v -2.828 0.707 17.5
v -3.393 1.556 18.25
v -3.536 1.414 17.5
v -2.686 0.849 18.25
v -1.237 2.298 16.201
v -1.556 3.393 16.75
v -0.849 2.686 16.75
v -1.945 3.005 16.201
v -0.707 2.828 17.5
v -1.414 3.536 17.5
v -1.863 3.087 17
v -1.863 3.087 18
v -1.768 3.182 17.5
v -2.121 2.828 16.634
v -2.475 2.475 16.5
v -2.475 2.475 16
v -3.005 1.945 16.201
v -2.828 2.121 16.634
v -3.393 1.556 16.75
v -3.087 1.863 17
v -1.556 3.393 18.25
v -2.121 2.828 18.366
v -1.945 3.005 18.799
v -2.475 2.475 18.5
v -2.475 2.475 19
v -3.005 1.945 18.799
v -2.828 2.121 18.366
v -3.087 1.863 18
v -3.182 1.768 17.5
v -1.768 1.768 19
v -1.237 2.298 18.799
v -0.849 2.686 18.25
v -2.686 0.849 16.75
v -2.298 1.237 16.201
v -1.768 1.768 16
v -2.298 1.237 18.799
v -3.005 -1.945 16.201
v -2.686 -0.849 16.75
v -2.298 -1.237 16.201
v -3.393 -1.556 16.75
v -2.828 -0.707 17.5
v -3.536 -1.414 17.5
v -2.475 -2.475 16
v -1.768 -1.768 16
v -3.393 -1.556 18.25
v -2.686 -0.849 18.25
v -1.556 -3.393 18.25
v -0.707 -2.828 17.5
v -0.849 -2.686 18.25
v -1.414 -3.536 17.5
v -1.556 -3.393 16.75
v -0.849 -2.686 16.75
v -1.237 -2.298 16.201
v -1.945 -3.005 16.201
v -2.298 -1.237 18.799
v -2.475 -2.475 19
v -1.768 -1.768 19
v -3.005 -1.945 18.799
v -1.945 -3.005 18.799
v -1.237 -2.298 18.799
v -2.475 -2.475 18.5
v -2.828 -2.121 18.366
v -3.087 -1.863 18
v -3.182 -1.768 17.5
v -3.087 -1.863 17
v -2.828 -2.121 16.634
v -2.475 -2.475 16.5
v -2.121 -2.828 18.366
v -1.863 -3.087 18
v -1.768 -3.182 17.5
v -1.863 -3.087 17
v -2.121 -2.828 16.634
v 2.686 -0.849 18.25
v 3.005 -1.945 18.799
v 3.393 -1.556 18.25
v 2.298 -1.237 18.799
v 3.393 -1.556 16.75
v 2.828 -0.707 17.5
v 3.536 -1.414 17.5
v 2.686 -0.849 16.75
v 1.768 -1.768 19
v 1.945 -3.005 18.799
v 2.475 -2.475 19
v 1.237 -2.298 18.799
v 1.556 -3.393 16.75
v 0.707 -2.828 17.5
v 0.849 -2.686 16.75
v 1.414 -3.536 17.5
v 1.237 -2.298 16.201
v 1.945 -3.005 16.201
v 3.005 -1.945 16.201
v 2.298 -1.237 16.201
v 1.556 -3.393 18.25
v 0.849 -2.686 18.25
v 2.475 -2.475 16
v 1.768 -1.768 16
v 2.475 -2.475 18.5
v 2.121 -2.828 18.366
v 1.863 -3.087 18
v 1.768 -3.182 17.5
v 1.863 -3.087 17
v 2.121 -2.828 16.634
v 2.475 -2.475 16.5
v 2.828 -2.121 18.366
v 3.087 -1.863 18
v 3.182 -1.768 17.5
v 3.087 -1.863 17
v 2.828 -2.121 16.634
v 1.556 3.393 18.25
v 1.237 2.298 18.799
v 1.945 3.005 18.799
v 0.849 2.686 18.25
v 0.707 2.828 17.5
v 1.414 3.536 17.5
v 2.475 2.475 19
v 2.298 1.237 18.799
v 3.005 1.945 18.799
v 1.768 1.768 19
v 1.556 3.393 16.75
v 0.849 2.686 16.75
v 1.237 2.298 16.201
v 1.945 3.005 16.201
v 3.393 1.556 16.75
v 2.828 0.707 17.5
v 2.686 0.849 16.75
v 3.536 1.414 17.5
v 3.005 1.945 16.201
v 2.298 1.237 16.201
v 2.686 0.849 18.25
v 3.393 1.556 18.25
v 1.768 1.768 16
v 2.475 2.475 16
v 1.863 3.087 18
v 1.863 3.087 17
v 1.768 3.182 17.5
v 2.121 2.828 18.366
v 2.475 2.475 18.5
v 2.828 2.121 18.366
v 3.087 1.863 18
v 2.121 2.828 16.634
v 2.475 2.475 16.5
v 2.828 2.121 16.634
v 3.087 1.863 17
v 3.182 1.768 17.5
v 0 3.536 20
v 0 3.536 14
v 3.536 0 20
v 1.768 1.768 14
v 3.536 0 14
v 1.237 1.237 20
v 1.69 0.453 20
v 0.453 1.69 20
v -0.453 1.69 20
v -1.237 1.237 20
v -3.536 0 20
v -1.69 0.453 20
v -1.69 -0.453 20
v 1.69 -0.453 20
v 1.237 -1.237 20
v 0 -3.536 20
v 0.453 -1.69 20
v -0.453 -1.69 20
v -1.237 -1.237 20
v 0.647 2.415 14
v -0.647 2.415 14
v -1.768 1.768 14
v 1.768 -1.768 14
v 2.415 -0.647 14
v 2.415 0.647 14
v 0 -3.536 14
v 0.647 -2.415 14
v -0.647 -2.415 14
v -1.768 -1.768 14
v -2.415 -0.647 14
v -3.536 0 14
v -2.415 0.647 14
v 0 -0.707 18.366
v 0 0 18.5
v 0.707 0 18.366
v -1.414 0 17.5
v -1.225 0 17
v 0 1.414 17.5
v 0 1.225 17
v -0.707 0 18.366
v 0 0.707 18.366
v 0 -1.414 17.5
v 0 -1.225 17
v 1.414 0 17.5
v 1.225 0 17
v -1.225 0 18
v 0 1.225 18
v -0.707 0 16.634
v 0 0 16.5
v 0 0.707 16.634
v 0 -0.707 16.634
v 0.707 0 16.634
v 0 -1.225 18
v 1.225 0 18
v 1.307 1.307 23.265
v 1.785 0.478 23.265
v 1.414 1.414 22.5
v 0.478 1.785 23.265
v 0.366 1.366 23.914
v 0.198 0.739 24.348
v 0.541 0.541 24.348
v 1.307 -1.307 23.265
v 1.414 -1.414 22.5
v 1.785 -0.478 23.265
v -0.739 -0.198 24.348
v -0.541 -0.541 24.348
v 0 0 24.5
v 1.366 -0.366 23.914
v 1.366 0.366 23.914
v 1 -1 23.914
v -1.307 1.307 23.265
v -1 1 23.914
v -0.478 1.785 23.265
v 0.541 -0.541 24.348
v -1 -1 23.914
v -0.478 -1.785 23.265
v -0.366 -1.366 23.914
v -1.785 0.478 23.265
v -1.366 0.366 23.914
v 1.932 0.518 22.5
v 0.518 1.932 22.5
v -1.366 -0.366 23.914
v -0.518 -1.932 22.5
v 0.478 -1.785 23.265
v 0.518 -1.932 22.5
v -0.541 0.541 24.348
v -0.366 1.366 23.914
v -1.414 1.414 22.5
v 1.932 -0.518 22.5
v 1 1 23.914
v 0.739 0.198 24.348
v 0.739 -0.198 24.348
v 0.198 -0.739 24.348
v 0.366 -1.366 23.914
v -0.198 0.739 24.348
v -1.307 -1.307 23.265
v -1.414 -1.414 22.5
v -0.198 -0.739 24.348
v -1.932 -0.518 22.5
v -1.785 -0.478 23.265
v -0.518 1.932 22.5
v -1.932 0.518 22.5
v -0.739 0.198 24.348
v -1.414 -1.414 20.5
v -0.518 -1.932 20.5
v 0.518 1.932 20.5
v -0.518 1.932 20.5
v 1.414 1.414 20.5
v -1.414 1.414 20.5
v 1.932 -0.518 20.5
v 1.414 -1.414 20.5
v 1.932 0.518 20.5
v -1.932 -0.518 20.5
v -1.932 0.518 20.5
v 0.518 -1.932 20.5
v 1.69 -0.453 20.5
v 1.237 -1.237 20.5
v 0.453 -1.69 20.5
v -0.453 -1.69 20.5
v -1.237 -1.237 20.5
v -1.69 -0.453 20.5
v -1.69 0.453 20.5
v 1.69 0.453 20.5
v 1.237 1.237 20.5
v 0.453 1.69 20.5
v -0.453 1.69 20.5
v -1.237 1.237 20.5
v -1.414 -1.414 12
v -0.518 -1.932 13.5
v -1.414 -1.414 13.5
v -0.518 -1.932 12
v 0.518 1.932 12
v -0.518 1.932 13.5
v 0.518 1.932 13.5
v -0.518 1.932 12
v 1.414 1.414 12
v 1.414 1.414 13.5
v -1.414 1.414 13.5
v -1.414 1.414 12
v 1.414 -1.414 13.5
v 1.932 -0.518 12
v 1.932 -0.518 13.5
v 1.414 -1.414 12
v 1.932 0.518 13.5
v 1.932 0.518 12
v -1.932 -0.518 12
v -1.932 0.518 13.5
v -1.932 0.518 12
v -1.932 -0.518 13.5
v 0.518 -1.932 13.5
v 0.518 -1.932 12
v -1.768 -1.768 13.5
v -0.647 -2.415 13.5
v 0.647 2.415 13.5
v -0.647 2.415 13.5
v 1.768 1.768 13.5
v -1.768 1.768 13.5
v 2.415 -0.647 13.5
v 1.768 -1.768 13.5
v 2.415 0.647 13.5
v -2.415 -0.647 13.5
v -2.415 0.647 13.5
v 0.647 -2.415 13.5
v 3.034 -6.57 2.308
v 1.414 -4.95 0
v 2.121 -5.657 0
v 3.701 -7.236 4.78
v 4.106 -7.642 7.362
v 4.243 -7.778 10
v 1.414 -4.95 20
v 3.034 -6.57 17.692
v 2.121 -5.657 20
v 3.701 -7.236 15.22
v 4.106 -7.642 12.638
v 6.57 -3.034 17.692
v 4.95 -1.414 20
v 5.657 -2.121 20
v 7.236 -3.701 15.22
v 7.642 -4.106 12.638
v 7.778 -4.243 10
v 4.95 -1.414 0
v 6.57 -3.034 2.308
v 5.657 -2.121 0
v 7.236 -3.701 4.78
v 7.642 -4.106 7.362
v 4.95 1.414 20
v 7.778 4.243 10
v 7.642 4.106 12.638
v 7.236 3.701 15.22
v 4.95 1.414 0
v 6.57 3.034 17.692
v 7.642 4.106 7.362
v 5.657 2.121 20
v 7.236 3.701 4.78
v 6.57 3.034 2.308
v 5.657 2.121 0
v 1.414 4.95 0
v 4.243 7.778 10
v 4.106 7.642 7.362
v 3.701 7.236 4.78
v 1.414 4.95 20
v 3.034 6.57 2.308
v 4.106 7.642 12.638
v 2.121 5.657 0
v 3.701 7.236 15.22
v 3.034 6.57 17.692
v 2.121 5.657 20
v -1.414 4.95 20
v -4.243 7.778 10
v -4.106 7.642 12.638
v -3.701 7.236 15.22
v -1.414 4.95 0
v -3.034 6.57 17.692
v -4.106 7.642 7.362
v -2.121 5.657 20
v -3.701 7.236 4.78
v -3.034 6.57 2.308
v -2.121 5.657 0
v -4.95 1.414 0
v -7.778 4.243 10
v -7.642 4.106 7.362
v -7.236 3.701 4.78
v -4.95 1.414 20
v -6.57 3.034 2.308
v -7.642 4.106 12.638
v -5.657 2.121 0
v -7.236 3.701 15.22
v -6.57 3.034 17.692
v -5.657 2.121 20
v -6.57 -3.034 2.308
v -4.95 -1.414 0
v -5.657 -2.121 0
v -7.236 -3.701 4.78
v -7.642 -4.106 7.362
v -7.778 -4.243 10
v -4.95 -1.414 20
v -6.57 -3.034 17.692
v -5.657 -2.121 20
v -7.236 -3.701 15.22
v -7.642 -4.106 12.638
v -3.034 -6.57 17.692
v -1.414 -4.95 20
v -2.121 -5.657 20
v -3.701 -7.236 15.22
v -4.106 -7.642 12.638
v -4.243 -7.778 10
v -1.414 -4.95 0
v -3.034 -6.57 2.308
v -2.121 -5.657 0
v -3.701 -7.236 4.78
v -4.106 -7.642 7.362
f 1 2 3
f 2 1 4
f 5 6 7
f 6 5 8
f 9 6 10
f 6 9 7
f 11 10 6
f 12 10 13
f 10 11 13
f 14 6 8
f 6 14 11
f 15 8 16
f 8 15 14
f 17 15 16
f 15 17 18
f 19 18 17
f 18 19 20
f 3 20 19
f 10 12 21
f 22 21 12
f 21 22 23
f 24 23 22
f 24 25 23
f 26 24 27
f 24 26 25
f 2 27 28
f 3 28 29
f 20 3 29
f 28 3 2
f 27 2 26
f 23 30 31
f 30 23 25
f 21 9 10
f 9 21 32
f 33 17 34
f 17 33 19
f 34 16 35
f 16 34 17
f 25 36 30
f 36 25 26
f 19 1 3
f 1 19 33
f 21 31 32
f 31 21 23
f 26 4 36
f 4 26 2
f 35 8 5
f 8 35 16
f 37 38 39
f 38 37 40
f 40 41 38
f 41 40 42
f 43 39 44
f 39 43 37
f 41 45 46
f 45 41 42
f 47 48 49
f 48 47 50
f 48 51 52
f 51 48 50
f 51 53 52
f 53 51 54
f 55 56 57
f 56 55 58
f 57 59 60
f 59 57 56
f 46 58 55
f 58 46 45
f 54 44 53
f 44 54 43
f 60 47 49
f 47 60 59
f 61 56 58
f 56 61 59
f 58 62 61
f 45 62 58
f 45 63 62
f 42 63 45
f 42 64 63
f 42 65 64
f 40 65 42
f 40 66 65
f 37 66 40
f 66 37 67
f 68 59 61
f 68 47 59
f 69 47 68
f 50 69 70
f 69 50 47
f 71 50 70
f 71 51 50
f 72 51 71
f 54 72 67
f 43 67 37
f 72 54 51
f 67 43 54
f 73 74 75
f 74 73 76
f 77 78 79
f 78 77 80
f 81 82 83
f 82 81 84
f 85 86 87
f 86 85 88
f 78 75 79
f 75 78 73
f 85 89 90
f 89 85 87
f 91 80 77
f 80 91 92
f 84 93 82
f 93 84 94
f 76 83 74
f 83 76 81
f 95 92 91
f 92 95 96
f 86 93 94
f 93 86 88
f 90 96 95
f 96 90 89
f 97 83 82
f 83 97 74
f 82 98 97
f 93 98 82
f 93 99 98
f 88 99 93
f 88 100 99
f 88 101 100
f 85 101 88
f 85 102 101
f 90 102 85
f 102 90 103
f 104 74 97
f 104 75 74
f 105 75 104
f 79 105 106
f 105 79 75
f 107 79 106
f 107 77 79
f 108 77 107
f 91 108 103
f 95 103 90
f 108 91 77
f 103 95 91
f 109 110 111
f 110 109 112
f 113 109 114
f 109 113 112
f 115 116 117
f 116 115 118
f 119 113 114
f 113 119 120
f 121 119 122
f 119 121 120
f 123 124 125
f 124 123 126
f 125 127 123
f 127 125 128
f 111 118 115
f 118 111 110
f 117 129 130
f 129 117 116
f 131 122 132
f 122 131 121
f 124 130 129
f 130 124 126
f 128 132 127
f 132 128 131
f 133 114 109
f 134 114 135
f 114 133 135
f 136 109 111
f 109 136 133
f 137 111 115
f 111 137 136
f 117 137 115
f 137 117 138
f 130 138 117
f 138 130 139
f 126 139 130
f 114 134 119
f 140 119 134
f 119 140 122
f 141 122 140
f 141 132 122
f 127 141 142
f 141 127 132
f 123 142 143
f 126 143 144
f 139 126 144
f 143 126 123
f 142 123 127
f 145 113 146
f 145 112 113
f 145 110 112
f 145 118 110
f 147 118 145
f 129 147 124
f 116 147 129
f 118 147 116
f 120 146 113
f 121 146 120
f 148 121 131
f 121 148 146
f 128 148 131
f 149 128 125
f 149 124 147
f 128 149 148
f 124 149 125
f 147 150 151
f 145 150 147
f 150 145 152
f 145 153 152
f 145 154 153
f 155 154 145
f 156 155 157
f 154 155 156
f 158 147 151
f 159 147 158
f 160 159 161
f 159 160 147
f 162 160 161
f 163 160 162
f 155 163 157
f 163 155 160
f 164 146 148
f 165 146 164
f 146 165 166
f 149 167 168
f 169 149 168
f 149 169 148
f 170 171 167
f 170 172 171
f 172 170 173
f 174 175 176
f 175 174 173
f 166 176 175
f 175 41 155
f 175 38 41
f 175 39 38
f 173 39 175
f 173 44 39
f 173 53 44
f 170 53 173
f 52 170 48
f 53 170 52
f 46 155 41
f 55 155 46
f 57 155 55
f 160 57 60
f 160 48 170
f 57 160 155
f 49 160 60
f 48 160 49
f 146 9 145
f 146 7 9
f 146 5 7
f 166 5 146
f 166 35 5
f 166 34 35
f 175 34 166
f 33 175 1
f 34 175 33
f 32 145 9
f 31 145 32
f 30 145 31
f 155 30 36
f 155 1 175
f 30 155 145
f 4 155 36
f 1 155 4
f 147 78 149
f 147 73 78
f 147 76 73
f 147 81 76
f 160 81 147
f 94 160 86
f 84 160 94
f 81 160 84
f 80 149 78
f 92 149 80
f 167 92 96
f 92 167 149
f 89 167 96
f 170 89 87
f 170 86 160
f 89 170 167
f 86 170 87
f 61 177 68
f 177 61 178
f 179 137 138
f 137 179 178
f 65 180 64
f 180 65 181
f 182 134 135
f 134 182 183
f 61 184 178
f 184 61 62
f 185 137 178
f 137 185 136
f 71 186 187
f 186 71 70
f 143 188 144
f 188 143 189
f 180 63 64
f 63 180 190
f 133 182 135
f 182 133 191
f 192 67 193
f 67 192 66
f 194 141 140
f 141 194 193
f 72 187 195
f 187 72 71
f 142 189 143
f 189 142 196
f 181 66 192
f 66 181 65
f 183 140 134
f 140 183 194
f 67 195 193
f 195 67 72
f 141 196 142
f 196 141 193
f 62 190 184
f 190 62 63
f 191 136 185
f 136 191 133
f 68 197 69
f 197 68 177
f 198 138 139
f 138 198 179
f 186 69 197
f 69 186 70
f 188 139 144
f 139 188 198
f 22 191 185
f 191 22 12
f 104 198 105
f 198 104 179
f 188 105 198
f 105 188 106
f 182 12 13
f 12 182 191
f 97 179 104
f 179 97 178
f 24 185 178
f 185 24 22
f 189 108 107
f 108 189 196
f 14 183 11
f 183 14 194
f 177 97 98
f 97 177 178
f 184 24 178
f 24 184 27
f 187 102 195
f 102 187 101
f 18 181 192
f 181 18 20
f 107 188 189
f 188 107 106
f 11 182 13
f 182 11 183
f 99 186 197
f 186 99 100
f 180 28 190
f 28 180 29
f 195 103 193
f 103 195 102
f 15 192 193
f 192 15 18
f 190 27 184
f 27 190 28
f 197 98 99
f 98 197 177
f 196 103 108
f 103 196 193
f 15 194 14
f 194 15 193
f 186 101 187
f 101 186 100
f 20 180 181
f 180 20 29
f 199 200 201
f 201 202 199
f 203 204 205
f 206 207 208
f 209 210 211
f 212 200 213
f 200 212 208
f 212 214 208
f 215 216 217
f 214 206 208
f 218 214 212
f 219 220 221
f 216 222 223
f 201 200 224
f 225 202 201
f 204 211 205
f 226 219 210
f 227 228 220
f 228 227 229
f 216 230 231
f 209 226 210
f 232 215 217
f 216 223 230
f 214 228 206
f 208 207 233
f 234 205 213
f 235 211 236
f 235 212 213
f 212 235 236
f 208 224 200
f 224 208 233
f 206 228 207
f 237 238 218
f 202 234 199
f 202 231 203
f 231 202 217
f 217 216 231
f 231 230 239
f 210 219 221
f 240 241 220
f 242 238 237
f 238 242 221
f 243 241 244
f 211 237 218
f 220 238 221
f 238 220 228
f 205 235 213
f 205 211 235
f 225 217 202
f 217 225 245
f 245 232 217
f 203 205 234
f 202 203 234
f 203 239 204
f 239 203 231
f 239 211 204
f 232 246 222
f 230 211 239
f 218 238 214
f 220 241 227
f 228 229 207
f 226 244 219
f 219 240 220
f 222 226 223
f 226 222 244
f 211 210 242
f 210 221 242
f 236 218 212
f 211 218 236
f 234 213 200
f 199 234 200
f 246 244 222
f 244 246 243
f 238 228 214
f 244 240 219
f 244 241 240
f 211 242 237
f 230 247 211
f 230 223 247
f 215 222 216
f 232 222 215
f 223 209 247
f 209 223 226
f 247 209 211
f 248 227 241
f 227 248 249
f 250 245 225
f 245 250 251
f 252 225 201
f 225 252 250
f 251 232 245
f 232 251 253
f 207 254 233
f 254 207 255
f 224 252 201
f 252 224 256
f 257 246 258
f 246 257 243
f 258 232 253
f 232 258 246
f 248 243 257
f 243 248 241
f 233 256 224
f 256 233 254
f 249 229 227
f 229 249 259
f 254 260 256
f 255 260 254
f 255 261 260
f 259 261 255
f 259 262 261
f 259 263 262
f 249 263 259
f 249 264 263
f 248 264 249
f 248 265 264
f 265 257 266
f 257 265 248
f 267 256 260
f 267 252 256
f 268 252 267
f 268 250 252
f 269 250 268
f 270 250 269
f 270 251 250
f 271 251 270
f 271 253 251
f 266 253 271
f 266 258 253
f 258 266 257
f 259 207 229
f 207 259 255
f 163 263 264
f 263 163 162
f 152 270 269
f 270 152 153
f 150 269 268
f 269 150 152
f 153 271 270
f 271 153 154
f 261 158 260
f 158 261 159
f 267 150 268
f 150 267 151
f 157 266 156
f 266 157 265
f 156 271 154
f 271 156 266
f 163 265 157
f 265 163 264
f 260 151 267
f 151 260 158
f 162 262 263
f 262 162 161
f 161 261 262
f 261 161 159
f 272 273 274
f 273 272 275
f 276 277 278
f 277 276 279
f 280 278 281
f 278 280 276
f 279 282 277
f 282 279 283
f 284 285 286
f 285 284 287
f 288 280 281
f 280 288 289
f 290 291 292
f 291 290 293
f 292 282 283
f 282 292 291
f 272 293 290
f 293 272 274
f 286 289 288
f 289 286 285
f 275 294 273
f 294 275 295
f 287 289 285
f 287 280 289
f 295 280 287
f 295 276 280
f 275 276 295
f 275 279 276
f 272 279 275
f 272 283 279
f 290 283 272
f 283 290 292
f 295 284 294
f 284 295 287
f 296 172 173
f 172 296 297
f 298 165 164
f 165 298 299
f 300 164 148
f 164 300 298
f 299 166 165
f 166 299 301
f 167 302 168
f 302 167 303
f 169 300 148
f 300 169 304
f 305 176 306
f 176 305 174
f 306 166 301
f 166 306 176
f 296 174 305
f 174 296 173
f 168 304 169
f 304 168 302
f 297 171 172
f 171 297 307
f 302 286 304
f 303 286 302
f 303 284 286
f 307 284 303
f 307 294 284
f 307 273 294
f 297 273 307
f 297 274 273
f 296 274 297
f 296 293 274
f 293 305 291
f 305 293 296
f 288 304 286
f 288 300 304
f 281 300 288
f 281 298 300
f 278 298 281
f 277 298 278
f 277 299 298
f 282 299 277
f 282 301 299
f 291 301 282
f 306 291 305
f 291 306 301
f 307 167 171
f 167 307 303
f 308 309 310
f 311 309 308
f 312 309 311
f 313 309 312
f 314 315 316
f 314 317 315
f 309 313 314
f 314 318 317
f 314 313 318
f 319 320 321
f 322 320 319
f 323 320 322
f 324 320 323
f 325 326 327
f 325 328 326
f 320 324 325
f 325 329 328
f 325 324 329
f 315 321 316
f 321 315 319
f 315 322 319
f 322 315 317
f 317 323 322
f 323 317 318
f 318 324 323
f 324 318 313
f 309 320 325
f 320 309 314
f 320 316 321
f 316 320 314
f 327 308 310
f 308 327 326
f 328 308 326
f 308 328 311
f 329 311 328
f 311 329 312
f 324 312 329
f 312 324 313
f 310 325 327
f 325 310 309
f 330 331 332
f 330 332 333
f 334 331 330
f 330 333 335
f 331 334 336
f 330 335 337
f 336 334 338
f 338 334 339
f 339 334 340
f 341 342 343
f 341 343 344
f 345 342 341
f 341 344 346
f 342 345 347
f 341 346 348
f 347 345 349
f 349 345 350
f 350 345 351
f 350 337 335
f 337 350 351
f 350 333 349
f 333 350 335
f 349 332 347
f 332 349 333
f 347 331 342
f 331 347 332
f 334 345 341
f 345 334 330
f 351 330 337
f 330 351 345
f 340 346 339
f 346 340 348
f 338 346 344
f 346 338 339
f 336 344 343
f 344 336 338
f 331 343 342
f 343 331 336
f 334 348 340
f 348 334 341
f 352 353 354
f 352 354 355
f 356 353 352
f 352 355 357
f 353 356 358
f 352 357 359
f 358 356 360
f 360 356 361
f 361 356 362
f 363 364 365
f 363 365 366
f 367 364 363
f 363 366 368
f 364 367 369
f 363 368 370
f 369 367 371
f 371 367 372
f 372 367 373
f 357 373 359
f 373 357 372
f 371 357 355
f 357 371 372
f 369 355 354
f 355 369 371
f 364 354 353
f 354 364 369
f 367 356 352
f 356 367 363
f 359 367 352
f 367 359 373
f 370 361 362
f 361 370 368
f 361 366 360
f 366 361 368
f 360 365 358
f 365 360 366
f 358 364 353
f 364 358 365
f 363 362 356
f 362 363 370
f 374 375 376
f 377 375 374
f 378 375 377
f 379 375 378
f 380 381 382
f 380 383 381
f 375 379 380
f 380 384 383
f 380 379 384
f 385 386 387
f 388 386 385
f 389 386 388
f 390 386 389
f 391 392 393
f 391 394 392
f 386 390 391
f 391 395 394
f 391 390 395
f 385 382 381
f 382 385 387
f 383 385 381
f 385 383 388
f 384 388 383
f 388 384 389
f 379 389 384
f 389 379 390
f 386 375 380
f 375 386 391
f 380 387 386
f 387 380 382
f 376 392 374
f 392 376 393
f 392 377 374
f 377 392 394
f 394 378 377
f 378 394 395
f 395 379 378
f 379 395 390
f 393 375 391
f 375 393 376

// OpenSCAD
// file: ../kal/bricks_bow/plate_bow_1x4_double.scad
// plate_bow_1x4_double

// external vars #########################

ext_scale = 1.0;
ext_fn = 12;

// part ##################################

module plate_bow_1x4_double(m_scale=ext_scale,m_fn=ext_fn) {
    scale([m_scale,m_scale,m_scale])
    translate([-2.5,0,0]) rotate([0,0,90])
    union() {
        pts_base = [[10,1],[10,0],[5,0],[5,2],[-1,2],[0,4]];
        hyp_bow = sqrt(109);
        r_bow = (hyp_bow/2)/(3/hyp_bow);
        u_bow = r_bow-4;
        ang_bow = (90-acos(3/hyp_bow))*2;
        div = m_fn/3;
        pts_arc = [for (i=[1:div-1]) let (ang = 90-(ang_bow/div)*i) [cos(ang)*r_bow,sin(ang)*r_bow-u_bow]];
        pts = concat(pts_base,pts_arc);
        rotate([90,0,0]) linear_extrude(height=5) polygon(pts);
        mirror([1,0,0]) rotate([90,0,0]) linear_extrude(height=5) polygon(pts);
    }
}

plate_bow_1x4_double();
// file: ../kal/plates/plate_1x2.scad
// plate 1x2

// external vars #########################

ext_scale = 1.0;
ext_fn = 12;

// part ##################################

module plate_1x2(m_scale=ext_scale,m_fn=ext_fn) {
    scale([m_scale,m_scale,m_scale])
    translate([-2.5,-5,0])
    cube([5,10,2]);
}

plate_1x2();
// file: ../kal/plates_round/plate_round_1x1_wo_stud.scad
// plate round 1x1 wo stud

// external vars #########################

ext_scale = 1.0;
ext_fn = 12;

// part ##################################

module plate_round_1x1_wo_stud(m_scale=ext_scale,m_fn=ext_fn) {
    scale([m_scale,m_scale,m_scale])
    union() {
        cylinder(h=2,d=4,center=false,$fn=m_fn);
        translate([0,0,1.5])
        cylinder(h=0.5,d=5,center=false,$fn=m_fn);
    }
}

plate_round_1x1_wo_stud();
// file: ../kal/electric/globe_1x1.scad
// globe 1x1

// external vars #########################

ext_scale = 1.0;
ext_fn = 12;

// part ##################################

module globe_1x1(m_scale=ext_scale,m_fn=ext_fn) {
    scale([m_scale,m_scale,m_scale])
    union() {
        pts_base = [[2,0],[0,-1],[0,2]];
        div = m_fn/3;
        pts_arc = [for (i=[1:div-1]) let (ang = 90-(90/div)*i) [cos(ang)*2,sin(ang)*2]];
        pts = concat(pts_base,pts_arc);
        translate([0,0,2.5]) rotate([0,0,180])
        rotate_extrude(angle=360,$fn=m_fn) polygon(pts);
        translate([0,0,0.5]) cylinder(h=2,d=4,center=false,$fn=m_fn);
        cylinder(h=1,d=3.5,center=false,$fn=m_fn);
    }
}

globe_1x1();
// file: ../kal/bricks_special/brick_1x1_4_side_stud_w_holes.scad
// brick 1x1 4 side stud w holes

// external vars #########################

ext_scale = 1.0;
ext_fn = 12;

// part ##################################

module brick_1x1_4_side_stud_w_holes(m_scale=ext_scale,m_fn=ext_fn) {
    scale([m_scale,m_scale,m_scale])
    difference() {
        union() {
            translate([-2.5,-2.5,0]) cube([5,5,6],center=false);
            for (i = [0:3]) {
                rotate([0,0,90*i]) translate([0,2,3.5])
                rotate([-90,0,0]) cylinder(h=1.5,d=3,center=false,$fn=m_fn);
            }
        }
        translate([-4,0,3.5]) rotate([0,90,0])
        cylinder(h=8,d=2,center=false,$fn=m_fn);
        translate([0,4,3.5]) rotate([90,0,0])
        cylinder(h=8,d=2,center=false,$fn=m_fn);
    }
}

brick_1x1_4_side_stud_w_holes();
// main file
// courge basic
// nb parts : 11

// uses ##################################

use <../kal/bricks_special/brick_1x1_4_side_stud_w_holes.scad>;
use <../kal/electric/globe_1x1.scad>;
use <../kal/plates_round/plate_round_1x1_wo_stud.scad>;
use <../kal/plates/plate_1x2.scad>;
use <../kal/bricks_bow/plate_bow_1x4_double.scad>;

// external vars #########################

ext_scale = 1.0;
ext_fn = 12;
id_part = -1;

// internal modules ######################

module leg(rot,pieces) {
    rotate([0,0,90*rot])
    translate([0,-4.5,-4])
    rotate([90,0,0])
    if (pieces == 0) color("Orange") plate_1x2();
    else color("Brown") plate_bow_1x4_double();
}

// part ##################################

module parts(id_part=-1,all=false) {
    rotate([0,0,45])
    translate([0,0,14]) {
        if (id_part == 0 || all) color("Brown") brick_1x1_4_side_stud_w_holes();
        if (id_part == 1 || all) translate([0,0,6]) color("Green") globe_1x1();
        if (id_part == 2 || all) translate([0,0,-2]) color("Lime") plate_round_1x1_wo_stud();
        if (id_part == 3 || all) leg(0,0);
        if (id_part == 4 || all) leg(1,0);
        if (id_part == 5 || all) leg(2,0);
        if (id_part == 6 || all) leg(3,0);
        if (id_part == 7 || all) leg(0,1);
        if (id_part == 8 || all) leg(1,1);
        if (id_part == 9 || all) leg(2,1);
        if (id_part == 10 || all) leg(3,1);
    }
}

if (id_part > -1) parts(id_part=id_part);
else parts(all=true);
